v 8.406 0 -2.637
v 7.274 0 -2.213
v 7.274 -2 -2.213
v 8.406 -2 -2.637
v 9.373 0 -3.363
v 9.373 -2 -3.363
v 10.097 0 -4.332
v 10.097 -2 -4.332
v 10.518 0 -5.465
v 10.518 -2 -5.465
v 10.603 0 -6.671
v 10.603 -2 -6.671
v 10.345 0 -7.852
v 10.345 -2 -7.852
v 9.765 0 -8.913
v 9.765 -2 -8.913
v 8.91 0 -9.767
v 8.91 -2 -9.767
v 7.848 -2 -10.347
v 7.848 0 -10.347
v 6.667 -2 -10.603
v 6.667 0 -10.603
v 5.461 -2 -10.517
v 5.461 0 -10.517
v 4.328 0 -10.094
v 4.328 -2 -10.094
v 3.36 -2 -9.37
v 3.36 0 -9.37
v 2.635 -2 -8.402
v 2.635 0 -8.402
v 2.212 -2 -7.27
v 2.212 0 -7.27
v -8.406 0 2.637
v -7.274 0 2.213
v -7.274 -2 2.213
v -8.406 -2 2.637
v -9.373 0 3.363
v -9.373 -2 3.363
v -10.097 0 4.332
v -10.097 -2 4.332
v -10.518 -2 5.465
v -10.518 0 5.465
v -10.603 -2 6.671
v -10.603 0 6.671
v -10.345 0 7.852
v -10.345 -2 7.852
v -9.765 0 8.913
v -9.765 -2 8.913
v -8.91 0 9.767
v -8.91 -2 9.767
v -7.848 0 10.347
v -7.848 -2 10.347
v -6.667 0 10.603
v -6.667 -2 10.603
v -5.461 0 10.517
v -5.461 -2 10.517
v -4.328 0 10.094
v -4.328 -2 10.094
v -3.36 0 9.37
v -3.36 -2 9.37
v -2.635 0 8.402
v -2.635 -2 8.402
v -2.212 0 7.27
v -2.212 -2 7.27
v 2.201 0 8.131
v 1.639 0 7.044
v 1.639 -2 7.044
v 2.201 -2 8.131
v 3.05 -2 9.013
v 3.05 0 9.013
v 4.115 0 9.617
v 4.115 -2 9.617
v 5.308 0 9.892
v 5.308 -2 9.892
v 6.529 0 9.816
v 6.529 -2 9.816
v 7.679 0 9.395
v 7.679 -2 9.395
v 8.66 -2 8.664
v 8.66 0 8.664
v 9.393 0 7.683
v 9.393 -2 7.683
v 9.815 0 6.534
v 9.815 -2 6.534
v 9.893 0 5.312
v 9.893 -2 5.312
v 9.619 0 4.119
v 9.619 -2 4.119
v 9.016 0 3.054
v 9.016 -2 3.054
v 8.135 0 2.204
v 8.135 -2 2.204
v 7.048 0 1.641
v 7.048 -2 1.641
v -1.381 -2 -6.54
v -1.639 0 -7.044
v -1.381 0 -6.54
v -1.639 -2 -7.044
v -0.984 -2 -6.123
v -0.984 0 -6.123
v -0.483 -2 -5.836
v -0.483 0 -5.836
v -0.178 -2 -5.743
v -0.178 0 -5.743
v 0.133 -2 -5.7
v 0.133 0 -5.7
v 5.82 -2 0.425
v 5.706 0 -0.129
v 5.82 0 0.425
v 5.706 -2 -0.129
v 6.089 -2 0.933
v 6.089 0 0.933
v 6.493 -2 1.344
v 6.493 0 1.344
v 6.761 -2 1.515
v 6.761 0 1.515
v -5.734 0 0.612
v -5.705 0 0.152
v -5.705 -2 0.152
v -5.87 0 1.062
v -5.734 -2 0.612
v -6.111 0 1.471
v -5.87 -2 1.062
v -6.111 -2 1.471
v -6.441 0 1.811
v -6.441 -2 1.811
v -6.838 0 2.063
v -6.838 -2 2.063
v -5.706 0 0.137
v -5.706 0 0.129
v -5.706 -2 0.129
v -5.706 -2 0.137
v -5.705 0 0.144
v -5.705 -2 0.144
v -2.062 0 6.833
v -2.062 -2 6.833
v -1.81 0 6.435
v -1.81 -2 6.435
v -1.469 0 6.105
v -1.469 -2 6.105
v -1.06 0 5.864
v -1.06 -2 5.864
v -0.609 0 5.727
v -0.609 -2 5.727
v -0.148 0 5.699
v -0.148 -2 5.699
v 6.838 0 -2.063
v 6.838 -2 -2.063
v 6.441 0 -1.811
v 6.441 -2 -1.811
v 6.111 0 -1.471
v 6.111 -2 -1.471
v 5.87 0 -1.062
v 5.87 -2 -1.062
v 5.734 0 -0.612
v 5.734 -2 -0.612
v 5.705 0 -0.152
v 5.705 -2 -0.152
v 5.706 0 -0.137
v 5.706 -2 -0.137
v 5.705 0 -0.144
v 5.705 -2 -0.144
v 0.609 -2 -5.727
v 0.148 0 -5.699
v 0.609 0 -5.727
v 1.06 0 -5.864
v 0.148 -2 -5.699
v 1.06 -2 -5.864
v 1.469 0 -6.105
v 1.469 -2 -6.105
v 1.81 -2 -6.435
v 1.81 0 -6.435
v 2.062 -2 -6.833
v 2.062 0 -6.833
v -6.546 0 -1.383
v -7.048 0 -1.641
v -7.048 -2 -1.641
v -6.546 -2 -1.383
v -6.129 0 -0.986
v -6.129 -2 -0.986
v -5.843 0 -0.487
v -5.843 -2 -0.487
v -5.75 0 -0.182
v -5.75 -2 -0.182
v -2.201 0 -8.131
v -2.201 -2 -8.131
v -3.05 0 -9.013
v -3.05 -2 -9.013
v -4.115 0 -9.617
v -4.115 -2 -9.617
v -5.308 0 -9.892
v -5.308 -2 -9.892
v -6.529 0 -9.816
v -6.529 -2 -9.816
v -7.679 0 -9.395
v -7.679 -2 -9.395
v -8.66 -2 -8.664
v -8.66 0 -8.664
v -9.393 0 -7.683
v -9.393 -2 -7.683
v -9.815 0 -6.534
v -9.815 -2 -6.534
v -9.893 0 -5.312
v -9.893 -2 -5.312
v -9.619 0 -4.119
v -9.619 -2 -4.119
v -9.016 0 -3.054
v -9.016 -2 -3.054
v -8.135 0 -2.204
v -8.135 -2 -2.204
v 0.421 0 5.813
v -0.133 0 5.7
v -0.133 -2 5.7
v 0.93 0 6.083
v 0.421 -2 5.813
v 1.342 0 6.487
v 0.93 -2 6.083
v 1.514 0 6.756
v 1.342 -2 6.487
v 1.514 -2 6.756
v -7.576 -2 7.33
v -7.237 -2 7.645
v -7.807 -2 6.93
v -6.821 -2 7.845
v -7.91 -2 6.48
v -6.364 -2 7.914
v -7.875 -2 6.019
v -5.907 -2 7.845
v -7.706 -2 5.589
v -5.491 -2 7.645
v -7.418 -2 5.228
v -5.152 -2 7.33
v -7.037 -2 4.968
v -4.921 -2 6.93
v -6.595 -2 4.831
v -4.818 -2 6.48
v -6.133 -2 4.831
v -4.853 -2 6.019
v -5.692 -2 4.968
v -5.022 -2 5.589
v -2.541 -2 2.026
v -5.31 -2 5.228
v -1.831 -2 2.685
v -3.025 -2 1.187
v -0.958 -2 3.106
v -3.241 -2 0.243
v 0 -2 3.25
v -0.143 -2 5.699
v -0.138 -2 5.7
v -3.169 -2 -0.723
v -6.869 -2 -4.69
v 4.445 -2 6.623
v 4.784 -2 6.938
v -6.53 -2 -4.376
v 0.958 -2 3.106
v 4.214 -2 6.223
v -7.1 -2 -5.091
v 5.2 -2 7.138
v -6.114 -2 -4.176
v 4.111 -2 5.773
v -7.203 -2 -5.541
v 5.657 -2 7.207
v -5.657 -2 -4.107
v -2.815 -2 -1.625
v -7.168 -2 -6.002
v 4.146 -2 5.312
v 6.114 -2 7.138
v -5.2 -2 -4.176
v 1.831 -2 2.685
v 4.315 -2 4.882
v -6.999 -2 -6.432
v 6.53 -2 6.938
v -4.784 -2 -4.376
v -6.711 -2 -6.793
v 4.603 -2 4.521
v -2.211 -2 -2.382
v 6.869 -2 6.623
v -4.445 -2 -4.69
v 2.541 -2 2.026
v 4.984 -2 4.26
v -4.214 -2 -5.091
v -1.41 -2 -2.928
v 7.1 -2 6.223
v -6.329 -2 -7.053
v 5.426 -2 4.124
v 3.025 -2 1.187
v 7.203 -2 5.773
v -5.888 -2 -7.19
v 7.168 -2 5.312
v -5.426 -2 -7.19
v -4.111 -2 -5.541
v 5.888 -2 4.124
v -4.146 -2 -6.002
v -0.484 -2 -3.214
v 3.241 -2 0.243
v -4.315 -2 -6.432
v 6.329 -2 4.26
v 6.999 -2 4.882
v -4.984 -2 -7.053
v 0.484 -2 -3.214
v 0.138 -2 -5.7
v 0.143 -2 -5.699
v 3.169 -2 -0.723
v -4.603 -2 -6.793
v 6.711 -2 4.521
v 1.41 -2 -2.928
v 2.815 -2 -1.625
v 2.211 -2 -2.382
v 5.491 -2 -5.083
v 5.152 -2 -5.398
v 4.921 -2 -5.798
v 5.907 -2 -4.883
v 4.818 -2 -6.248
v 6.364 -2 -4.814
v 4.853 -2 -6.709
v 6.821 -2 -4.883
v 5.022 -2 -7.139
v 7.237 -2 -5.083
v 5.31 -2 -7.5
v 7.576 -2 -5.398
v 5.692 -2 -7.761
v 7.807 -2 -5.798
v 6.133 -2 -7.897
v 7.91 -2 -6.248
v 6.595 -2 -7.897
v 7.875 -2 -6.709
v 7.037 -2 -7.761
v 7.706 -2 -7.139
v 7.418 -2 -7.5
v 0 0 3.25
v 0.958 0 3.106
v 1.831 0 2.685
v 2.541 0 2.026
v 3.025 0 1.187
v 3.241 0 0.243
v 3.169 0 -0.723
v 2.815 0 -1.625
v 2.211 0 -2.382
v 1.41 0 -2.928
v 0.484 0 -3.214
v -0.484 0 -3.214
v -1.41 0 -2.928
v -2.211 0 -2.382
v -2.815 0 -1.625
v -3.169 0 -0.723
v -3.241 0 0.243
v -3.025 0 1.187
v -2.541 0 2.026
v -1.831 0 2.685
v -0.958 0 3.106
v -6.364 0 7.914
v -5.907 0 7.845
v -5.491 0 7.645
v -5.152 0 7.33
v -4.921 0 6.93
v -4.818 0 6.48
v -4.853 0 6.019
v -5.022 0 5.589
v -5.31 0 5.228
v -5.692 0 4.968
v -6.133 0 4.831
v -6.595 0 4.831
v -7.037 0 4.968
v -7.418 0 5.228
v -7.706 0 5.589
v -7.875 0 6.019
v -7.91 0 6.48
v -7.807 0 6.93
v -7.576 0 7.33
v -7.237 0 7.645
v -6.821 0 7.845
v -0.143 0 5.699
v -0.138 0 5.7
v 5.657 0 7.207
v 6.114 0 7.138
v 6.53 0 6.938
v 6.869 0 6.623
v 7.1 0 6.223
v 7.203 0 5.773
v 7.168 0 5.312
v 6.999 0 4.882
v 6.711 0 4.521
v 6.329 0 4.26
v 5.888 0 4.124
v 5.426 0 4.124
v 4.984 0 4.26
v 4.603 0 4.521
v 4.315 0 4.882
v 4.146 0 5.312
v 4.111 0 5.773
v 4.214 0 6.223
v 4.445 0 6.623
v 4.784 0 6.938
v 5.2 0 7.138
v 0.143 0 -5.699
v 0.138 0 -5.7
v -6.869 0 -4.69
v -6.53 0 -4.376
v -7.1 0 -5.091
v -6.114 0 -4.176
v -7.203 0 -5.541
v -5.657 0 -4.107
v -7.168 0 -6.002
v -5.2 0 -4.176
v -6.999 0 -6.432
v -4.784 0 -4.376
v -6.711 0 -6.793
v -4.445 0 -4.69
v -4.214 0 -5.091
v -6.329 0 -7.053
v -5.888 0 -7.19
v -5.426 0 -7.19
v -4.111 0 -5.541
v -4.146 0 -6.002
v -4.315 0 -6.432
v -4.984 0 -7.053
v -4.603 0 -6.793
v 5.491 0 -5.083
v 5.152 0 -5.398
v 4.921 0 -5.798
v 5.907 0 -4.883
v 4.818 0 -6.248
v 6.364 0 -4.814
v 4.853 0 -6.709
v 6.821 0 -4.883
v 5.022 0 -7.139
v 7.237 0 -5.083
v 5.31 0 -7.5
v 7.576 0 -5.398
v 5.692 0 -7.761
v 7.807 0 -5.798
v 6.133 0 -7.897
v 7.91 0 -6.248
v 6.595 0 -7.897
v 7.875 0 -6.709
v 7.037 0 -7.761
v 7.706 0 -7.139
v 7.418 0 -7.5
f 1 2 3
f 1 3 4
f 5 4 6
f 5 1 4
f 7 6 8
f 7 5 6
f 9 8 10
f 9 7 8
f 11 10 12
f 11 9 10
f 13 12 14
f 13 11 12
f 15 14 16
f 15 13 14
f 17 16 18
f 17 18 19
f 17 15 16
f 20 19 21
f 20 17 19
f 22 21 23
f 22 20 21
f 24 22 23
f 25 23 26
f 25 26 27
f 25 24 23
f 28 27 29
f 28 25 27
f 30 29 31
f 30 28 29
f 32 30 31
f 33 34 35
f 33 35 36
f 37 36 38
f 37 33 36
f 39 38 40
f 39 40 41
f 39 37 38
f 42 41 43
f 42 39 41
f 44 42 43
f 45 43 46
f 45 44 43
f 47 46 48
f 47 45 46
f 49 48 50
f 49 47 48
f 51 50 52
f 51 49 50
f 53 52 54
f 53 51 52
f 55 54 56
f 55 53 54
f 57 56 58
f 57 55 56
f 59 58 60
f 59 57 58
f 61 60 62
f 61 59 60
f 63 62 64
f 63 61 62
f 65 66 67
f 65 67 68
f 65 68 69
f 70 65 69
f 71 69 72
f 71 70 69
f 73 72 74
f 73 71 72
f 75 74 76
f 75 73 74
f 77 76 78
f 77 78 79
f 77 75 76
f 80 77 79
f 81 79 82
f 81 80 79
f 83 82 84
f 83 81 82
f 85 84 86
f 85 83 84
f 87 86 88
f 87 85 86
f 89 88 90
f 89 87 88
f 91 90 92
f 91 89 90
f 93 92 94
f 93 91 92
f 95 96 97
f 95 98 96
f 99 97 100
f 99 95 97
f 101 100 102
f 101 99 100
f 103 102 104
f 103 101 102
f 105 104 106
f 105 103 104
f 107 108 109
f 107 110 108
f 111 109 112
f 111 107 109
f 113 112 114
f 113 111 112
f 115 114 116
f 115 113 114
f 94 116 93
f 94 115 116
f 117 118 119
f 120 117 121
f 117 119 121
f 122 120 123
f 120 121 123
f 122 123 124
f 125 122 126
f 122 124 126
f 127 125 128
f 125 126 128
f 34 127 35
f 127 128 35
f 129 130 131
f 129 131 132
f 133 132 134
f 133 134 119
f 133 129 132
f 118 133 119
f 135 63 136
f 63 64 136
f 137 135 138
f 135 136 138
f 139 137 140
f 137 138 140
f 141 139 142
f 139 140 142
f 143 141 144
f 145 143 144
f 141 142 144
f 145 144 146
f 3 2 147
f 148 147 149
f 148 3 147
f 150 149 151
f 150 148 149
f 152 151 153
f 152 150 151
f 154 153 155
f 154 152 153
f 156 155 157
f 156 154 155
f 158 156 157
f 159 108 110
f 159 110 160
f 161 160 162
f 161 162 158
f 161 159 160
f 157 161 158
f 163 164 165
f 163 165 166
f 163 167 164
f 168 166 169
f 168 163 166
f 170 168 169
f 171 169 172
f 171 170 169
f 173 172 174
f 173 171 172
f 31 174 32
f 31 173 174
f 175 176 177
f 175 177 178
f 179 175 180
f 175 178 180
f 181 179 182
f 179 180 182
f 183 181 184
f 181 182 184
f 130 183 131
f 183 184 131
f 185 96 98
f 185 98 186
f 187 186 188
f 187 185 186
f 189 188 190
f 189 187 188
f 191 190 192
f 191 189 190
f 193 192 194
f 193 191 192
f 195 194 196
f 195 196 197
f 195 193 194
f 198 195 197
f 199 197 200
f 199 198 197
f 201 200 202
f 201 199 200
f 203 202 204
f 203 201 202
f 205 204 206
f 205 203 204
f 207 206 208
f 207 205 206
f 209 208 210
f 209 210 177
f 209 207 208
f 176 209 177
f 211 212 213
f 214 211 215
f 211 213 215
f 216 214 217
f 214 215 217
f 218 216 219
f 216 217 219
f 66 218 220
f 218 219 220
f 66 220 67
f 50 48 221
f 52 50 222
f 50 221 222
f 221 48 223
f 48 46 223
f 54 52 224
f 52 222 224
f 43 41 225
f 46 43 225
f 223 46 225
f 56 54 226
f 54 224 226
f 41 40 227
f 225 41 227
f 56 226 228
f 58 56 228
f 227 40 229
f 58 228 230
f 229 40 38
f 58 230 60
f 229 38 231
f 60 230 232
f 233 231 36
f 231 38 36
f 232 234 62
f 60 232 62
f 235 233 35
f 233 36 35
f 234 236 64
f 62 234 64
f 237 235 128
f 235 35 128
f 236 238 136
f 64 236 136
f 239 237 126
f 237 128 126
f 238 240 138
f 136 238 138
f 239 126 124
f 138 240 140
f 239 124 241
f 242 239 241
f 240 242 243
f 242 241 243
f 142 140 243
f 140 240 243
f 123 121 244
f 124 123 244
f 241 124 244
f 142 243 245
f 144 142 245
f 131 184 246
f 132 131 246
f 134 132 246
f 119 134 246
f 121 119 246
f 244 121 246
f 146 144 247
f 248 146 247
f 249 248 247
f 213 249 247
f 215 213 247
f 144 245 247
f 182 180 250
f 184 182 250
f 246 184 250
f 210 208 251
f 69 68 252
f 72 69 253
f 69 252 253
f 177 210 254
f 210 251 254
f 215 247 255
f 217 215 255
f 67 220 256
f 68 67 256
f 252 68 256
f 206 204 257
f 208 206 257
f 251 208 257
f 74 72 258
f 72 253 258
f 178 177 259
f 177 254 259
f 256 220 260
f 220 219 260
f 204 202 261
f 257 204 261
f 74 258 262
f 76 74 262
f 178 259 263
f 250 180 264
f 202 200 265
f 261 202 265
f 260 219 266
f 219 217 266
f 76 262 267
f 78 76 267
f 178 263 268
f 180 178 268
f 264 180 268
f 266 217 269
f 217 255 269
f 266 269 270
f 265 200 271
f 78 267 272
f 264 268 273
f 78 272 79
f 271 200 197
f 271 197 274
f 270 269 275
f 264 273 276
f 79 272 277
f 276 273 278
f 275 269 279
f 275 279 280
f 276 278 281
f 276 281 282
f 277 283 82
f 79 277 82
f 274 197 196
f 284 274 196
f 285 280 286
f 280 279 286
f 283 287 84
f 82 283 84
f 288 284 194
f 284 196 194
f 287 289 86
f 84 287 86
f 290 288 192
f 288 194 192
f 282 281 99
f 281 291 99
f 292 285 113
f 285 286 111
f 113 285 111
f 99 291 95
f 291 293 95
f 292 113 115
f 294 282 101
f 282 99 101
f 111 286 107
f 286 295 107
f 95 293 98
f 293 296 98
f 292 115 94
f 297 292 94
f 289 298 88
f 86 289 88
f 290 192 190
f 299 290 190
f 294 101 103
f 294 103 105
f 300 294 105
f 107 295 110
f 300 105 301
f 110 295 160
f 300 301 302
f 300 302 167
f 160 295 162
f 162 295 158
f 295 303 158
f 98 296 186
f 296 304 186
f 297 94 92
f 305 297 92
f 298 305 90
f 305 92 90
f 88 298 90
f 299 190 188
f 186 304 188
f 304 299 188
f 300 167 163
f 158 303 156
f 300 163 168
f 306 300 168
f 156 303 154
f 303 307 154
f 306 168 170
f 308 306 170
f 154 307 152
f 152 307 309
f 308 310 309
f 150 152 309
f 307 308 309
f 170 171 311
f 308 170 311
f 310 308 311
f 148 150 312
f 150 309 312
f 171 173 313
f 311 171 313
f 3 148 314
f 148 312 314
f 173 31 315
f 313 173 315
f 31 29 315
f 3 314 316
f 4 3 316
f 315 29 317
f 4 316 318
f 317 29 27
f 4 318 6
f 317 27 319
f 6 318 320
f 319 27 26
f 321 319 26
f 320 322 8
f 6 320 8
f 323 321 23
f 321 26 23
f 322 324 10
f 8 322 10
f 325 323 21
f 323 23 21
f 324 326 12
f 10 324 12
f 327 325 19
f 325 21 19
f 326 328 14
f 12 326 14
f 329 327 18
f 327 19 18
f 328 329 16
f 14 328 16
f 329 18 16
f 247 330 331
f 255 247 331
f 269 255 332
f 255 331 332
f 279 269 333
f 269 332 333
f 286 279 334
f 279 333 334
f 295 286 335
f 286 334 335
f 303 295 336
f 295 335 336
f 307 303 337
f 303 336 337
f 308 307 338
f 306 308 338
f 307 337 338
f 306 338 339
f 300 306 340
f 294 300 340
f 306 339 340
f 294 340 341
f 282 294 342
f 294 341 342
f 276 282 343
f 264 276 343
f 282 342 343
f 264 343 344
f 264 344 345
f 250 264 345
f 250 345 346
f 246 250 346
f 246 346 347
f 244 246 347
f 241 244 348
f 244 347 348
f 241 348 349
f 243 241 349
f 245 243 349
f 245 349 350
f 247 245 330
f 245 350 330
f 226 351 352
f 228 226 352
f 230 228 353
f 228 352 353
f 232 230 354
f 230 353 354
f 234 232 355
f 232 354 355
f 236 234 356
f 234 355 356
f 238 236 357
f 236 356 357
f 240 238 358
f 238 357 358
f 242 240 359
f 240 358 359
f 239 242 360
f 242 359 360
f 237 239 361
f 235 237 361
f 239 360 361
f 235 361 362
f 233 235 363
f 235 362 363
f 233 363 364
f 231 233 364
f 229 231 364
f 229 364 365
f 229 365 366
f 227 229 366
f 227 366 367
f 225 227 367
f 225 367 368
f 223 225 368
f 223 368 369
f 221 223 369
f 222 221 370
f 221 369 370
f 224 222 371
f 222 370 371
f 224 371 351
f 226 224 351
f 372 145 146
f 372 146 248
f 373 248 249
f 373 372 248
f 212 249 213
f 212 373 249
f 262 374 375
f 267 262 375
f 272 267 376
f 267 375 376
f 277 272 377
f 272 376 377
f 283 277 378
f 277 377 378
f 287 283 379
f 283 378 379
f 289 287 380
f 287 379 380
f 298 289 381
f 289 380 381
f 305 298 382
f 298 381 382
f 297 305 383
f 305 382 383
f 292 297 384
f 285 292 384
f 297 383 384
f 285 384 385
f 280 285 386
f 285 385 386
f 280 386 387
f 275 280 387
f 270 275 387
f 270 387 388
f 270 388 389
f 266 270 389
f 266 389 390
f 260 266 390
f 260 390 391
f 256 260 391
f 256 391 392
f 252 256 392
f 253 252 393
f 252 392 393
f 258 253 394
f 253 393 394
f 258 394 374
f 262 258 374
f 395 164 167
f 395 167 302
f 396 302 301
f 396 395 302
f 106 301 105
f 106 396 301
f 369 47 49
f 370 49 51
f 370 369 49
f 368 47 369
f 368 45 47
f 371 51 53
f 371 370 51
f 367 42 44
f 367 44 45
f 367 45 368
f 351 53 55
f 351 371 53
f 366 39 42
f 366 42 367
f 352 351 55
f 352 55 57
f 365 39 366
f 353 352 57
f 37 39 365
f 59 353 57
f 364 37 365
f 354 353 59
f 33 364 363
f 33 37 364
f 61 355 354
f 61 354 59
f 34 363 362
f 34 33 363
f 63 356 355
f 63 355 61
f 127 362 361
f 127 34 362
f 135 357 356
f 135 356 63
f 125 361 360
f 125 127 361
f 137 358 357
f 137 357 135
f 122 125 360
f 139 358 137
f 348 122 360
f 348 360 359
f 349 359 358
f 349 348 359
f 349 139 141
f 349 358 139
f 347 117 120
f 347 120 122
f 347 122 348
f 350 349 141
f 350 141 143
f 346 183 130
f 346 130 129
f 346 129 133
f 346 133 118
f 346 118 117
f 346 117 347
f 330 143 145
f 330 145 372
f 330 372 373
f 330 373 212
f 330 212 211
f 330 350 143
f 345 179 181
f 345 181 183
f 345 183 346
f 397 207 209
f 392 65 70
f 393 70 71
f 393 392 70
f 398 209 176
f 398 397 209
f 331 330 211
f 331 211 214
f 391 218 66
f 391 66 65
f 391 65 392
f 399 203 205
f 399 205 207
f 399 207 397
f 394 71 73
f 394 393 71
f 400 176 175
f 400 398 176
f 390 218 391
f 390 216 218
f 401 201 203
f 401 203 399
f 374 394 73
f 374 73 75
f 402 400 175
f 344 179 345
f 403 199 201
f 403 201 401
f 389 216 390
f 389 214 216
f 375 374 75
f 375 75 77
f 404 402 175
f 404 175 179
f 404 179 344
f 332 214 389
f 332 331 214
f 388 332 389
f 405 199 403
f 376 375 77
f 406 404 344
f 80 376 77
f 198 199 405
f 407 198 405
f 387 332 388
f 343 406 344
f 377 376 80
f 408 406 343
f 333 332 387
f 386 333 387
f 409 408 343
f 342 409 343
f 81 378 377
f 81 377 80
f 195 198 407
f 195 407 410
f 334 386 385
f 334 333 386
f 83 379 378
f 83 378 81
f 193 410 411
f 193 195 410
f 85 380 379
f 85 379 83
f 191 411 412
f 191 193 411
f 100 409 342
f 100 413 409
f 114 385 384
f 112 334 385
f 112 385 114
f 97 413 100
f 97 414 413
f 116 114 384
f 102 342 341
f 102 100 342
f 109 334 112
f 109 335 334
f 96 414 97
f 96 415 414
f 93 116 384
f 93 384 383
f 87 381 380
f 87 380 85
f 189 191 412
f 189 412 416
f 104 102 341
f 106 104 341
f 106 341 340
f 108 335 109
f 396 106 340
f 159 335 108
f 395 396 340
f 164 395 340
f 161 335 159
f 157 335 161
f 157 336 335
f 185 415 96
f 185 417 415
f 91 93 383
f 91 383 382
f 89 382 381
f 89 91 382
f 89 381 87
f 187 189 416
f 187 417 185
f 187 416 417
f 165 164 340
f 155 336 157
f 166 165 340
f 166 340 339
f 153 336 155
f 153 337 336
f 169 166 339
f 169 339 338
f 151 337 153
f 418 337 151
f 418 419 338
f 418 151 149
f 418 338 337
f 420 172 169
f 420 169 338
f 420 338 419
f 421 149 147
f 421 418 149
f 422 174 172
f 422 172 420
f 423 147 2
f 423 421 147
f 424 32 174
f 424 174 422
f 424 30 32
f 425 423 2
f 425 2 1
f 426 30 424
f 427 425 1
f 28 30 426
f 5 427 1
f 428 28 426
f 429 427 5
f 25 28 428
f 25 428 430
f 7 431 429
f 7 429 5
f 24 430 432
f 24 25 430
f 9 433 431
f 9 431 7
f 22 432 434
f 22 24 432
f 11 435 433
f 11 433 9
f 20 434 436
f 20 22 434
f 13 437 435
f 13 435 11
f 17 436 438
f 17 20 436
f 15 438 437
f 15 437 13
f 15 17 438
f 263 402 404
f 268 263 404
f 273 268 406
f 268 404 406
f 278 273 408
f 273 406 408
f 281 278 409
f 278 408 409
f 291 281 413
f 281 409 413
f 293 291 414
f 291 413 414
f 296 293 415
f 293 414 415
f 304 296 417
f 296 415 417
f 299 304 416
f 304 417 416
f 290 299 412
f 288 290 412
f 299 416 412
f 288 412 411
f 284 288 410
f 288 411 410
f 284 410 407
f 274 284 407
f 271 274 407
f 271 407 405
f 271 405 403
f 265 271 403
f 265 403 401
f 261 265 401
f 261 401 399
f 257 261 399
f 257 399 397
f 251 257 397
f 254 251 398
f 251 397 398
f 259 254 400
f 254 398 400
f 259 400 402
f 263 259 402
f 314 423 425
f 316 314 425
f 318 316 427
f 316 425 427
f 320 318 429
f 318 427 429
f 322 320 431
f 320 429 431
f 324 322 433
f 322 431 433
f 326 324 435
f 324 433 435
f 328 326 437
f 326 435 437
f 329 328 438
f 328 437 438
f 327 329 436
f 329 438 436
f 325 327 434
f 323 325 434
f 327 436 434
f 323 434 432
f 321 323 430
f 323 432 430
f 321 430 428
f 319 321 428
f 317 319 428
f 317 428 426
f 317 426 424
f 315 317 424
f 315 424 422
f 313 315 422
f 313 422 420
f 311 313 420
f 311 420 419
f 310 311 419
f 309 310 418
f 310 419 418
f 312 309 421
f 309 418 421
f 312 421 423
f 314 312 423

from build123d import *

# Parameters (mm, degrees)
SKETCH1_R           = 1.55
SKETCH1_R_2         = 3.25
BOSS_EXTRUDE2_DEPTH = 2
FILLET1_R           = 2


with BuildPart() as part:
    # Sketch1 → Boss-Extrude2 (new body)
    with BuildSketch(Plane(origin=(0, 0, 0), x_dir=(1, 0, 0), z_dir=(0, 1, 0))):
        with BuildLine():
            ThreePointArc((-1.43909166, 6.179327925), (-8.65976943, 8.664344967), (-6.18574902, 1.439892035))
            ThreePointArc((-6.18574902, 1.439892035), (-5.7, -0.338953386), (-6.18574902, -2.117798807))
            ThreePointArc((-6.18574902, -2.117798807), (-9.366987419, -9.371531966), (-2.118073304, -6.179327925))
            ThreePointArc((-2.118073304, -6.179327925), (-0.339490822, -5.693734061), (1.43909166, -6.179327925))
            ThreePointArc((1.43909166, -6.179327925), (8.65976943, -8.664344967), (6.18574902, -1.439892035))
            ThreePointArc((6.18574902, -1.439892035), (5.7, 0.338953386), (6.18574902, 2.117798807))
            ThreePointArc((6.18574902, 2.117798807), (9.366987419, 9.371531966), (2.118073304, 6.179327925))
            ThreePointArc((2.118073304, 6.179327925), (0.339490822, 5.693734061), (-1.43909166, 6.179327925))
        make_face()
        with Locations(Location((-6.364056731, -6.364056731, 0), (0, 0, 270))):
            Circle(SKETCH1_R, mode=Mode.SUBTRACT)
        with Locations(Location((6.364056731, 6.364056731, 0), (0, 0, 270))):
            Circle(SKETCH1_R, mode=Mode.SUBTRACT)
        with Locations(Location((5.656854249, -5.656854249, 0), (0, 0, 270))):
            Circle(SKETCH1_R, mode=Mode.SUBTRACT)
        with Locations(Location((-5.656854249, 5.656854249, 0), (0, 0, 270))):
            Circle(SKETCH1_R, mode=Mode.SUBTRACT)
        with Locations(Location((0, 0, 0), (0, 0, 270))):
            Circle(SKETCH1_R_2, mode=Mode.SUBTRACT)
    extrude(amount=-BOSS_EXTRUDE2_DEPTH)

    # Fillet1
    fillet1_edges = [part.edges().sort_by_distance(p)[0] for p in [
        (-2.118073304, -1, 6.179327925),
        (-6.18574902, -1, 2.117798807),
        (-6.18574902, -1, -1.439892035),
        (-1.43909166, -1, -6.179327925),
        (2.118073304, -1, -6.179327925),
        (6.18574902, -1, -2.117798807),
        (6.18574902, -1, 1.439892035),
        (1.43909166, -1, 6.179327925),
    ]]
    fillet(fillet1_edges, radius=FILLET1_R)


solid = part.part
